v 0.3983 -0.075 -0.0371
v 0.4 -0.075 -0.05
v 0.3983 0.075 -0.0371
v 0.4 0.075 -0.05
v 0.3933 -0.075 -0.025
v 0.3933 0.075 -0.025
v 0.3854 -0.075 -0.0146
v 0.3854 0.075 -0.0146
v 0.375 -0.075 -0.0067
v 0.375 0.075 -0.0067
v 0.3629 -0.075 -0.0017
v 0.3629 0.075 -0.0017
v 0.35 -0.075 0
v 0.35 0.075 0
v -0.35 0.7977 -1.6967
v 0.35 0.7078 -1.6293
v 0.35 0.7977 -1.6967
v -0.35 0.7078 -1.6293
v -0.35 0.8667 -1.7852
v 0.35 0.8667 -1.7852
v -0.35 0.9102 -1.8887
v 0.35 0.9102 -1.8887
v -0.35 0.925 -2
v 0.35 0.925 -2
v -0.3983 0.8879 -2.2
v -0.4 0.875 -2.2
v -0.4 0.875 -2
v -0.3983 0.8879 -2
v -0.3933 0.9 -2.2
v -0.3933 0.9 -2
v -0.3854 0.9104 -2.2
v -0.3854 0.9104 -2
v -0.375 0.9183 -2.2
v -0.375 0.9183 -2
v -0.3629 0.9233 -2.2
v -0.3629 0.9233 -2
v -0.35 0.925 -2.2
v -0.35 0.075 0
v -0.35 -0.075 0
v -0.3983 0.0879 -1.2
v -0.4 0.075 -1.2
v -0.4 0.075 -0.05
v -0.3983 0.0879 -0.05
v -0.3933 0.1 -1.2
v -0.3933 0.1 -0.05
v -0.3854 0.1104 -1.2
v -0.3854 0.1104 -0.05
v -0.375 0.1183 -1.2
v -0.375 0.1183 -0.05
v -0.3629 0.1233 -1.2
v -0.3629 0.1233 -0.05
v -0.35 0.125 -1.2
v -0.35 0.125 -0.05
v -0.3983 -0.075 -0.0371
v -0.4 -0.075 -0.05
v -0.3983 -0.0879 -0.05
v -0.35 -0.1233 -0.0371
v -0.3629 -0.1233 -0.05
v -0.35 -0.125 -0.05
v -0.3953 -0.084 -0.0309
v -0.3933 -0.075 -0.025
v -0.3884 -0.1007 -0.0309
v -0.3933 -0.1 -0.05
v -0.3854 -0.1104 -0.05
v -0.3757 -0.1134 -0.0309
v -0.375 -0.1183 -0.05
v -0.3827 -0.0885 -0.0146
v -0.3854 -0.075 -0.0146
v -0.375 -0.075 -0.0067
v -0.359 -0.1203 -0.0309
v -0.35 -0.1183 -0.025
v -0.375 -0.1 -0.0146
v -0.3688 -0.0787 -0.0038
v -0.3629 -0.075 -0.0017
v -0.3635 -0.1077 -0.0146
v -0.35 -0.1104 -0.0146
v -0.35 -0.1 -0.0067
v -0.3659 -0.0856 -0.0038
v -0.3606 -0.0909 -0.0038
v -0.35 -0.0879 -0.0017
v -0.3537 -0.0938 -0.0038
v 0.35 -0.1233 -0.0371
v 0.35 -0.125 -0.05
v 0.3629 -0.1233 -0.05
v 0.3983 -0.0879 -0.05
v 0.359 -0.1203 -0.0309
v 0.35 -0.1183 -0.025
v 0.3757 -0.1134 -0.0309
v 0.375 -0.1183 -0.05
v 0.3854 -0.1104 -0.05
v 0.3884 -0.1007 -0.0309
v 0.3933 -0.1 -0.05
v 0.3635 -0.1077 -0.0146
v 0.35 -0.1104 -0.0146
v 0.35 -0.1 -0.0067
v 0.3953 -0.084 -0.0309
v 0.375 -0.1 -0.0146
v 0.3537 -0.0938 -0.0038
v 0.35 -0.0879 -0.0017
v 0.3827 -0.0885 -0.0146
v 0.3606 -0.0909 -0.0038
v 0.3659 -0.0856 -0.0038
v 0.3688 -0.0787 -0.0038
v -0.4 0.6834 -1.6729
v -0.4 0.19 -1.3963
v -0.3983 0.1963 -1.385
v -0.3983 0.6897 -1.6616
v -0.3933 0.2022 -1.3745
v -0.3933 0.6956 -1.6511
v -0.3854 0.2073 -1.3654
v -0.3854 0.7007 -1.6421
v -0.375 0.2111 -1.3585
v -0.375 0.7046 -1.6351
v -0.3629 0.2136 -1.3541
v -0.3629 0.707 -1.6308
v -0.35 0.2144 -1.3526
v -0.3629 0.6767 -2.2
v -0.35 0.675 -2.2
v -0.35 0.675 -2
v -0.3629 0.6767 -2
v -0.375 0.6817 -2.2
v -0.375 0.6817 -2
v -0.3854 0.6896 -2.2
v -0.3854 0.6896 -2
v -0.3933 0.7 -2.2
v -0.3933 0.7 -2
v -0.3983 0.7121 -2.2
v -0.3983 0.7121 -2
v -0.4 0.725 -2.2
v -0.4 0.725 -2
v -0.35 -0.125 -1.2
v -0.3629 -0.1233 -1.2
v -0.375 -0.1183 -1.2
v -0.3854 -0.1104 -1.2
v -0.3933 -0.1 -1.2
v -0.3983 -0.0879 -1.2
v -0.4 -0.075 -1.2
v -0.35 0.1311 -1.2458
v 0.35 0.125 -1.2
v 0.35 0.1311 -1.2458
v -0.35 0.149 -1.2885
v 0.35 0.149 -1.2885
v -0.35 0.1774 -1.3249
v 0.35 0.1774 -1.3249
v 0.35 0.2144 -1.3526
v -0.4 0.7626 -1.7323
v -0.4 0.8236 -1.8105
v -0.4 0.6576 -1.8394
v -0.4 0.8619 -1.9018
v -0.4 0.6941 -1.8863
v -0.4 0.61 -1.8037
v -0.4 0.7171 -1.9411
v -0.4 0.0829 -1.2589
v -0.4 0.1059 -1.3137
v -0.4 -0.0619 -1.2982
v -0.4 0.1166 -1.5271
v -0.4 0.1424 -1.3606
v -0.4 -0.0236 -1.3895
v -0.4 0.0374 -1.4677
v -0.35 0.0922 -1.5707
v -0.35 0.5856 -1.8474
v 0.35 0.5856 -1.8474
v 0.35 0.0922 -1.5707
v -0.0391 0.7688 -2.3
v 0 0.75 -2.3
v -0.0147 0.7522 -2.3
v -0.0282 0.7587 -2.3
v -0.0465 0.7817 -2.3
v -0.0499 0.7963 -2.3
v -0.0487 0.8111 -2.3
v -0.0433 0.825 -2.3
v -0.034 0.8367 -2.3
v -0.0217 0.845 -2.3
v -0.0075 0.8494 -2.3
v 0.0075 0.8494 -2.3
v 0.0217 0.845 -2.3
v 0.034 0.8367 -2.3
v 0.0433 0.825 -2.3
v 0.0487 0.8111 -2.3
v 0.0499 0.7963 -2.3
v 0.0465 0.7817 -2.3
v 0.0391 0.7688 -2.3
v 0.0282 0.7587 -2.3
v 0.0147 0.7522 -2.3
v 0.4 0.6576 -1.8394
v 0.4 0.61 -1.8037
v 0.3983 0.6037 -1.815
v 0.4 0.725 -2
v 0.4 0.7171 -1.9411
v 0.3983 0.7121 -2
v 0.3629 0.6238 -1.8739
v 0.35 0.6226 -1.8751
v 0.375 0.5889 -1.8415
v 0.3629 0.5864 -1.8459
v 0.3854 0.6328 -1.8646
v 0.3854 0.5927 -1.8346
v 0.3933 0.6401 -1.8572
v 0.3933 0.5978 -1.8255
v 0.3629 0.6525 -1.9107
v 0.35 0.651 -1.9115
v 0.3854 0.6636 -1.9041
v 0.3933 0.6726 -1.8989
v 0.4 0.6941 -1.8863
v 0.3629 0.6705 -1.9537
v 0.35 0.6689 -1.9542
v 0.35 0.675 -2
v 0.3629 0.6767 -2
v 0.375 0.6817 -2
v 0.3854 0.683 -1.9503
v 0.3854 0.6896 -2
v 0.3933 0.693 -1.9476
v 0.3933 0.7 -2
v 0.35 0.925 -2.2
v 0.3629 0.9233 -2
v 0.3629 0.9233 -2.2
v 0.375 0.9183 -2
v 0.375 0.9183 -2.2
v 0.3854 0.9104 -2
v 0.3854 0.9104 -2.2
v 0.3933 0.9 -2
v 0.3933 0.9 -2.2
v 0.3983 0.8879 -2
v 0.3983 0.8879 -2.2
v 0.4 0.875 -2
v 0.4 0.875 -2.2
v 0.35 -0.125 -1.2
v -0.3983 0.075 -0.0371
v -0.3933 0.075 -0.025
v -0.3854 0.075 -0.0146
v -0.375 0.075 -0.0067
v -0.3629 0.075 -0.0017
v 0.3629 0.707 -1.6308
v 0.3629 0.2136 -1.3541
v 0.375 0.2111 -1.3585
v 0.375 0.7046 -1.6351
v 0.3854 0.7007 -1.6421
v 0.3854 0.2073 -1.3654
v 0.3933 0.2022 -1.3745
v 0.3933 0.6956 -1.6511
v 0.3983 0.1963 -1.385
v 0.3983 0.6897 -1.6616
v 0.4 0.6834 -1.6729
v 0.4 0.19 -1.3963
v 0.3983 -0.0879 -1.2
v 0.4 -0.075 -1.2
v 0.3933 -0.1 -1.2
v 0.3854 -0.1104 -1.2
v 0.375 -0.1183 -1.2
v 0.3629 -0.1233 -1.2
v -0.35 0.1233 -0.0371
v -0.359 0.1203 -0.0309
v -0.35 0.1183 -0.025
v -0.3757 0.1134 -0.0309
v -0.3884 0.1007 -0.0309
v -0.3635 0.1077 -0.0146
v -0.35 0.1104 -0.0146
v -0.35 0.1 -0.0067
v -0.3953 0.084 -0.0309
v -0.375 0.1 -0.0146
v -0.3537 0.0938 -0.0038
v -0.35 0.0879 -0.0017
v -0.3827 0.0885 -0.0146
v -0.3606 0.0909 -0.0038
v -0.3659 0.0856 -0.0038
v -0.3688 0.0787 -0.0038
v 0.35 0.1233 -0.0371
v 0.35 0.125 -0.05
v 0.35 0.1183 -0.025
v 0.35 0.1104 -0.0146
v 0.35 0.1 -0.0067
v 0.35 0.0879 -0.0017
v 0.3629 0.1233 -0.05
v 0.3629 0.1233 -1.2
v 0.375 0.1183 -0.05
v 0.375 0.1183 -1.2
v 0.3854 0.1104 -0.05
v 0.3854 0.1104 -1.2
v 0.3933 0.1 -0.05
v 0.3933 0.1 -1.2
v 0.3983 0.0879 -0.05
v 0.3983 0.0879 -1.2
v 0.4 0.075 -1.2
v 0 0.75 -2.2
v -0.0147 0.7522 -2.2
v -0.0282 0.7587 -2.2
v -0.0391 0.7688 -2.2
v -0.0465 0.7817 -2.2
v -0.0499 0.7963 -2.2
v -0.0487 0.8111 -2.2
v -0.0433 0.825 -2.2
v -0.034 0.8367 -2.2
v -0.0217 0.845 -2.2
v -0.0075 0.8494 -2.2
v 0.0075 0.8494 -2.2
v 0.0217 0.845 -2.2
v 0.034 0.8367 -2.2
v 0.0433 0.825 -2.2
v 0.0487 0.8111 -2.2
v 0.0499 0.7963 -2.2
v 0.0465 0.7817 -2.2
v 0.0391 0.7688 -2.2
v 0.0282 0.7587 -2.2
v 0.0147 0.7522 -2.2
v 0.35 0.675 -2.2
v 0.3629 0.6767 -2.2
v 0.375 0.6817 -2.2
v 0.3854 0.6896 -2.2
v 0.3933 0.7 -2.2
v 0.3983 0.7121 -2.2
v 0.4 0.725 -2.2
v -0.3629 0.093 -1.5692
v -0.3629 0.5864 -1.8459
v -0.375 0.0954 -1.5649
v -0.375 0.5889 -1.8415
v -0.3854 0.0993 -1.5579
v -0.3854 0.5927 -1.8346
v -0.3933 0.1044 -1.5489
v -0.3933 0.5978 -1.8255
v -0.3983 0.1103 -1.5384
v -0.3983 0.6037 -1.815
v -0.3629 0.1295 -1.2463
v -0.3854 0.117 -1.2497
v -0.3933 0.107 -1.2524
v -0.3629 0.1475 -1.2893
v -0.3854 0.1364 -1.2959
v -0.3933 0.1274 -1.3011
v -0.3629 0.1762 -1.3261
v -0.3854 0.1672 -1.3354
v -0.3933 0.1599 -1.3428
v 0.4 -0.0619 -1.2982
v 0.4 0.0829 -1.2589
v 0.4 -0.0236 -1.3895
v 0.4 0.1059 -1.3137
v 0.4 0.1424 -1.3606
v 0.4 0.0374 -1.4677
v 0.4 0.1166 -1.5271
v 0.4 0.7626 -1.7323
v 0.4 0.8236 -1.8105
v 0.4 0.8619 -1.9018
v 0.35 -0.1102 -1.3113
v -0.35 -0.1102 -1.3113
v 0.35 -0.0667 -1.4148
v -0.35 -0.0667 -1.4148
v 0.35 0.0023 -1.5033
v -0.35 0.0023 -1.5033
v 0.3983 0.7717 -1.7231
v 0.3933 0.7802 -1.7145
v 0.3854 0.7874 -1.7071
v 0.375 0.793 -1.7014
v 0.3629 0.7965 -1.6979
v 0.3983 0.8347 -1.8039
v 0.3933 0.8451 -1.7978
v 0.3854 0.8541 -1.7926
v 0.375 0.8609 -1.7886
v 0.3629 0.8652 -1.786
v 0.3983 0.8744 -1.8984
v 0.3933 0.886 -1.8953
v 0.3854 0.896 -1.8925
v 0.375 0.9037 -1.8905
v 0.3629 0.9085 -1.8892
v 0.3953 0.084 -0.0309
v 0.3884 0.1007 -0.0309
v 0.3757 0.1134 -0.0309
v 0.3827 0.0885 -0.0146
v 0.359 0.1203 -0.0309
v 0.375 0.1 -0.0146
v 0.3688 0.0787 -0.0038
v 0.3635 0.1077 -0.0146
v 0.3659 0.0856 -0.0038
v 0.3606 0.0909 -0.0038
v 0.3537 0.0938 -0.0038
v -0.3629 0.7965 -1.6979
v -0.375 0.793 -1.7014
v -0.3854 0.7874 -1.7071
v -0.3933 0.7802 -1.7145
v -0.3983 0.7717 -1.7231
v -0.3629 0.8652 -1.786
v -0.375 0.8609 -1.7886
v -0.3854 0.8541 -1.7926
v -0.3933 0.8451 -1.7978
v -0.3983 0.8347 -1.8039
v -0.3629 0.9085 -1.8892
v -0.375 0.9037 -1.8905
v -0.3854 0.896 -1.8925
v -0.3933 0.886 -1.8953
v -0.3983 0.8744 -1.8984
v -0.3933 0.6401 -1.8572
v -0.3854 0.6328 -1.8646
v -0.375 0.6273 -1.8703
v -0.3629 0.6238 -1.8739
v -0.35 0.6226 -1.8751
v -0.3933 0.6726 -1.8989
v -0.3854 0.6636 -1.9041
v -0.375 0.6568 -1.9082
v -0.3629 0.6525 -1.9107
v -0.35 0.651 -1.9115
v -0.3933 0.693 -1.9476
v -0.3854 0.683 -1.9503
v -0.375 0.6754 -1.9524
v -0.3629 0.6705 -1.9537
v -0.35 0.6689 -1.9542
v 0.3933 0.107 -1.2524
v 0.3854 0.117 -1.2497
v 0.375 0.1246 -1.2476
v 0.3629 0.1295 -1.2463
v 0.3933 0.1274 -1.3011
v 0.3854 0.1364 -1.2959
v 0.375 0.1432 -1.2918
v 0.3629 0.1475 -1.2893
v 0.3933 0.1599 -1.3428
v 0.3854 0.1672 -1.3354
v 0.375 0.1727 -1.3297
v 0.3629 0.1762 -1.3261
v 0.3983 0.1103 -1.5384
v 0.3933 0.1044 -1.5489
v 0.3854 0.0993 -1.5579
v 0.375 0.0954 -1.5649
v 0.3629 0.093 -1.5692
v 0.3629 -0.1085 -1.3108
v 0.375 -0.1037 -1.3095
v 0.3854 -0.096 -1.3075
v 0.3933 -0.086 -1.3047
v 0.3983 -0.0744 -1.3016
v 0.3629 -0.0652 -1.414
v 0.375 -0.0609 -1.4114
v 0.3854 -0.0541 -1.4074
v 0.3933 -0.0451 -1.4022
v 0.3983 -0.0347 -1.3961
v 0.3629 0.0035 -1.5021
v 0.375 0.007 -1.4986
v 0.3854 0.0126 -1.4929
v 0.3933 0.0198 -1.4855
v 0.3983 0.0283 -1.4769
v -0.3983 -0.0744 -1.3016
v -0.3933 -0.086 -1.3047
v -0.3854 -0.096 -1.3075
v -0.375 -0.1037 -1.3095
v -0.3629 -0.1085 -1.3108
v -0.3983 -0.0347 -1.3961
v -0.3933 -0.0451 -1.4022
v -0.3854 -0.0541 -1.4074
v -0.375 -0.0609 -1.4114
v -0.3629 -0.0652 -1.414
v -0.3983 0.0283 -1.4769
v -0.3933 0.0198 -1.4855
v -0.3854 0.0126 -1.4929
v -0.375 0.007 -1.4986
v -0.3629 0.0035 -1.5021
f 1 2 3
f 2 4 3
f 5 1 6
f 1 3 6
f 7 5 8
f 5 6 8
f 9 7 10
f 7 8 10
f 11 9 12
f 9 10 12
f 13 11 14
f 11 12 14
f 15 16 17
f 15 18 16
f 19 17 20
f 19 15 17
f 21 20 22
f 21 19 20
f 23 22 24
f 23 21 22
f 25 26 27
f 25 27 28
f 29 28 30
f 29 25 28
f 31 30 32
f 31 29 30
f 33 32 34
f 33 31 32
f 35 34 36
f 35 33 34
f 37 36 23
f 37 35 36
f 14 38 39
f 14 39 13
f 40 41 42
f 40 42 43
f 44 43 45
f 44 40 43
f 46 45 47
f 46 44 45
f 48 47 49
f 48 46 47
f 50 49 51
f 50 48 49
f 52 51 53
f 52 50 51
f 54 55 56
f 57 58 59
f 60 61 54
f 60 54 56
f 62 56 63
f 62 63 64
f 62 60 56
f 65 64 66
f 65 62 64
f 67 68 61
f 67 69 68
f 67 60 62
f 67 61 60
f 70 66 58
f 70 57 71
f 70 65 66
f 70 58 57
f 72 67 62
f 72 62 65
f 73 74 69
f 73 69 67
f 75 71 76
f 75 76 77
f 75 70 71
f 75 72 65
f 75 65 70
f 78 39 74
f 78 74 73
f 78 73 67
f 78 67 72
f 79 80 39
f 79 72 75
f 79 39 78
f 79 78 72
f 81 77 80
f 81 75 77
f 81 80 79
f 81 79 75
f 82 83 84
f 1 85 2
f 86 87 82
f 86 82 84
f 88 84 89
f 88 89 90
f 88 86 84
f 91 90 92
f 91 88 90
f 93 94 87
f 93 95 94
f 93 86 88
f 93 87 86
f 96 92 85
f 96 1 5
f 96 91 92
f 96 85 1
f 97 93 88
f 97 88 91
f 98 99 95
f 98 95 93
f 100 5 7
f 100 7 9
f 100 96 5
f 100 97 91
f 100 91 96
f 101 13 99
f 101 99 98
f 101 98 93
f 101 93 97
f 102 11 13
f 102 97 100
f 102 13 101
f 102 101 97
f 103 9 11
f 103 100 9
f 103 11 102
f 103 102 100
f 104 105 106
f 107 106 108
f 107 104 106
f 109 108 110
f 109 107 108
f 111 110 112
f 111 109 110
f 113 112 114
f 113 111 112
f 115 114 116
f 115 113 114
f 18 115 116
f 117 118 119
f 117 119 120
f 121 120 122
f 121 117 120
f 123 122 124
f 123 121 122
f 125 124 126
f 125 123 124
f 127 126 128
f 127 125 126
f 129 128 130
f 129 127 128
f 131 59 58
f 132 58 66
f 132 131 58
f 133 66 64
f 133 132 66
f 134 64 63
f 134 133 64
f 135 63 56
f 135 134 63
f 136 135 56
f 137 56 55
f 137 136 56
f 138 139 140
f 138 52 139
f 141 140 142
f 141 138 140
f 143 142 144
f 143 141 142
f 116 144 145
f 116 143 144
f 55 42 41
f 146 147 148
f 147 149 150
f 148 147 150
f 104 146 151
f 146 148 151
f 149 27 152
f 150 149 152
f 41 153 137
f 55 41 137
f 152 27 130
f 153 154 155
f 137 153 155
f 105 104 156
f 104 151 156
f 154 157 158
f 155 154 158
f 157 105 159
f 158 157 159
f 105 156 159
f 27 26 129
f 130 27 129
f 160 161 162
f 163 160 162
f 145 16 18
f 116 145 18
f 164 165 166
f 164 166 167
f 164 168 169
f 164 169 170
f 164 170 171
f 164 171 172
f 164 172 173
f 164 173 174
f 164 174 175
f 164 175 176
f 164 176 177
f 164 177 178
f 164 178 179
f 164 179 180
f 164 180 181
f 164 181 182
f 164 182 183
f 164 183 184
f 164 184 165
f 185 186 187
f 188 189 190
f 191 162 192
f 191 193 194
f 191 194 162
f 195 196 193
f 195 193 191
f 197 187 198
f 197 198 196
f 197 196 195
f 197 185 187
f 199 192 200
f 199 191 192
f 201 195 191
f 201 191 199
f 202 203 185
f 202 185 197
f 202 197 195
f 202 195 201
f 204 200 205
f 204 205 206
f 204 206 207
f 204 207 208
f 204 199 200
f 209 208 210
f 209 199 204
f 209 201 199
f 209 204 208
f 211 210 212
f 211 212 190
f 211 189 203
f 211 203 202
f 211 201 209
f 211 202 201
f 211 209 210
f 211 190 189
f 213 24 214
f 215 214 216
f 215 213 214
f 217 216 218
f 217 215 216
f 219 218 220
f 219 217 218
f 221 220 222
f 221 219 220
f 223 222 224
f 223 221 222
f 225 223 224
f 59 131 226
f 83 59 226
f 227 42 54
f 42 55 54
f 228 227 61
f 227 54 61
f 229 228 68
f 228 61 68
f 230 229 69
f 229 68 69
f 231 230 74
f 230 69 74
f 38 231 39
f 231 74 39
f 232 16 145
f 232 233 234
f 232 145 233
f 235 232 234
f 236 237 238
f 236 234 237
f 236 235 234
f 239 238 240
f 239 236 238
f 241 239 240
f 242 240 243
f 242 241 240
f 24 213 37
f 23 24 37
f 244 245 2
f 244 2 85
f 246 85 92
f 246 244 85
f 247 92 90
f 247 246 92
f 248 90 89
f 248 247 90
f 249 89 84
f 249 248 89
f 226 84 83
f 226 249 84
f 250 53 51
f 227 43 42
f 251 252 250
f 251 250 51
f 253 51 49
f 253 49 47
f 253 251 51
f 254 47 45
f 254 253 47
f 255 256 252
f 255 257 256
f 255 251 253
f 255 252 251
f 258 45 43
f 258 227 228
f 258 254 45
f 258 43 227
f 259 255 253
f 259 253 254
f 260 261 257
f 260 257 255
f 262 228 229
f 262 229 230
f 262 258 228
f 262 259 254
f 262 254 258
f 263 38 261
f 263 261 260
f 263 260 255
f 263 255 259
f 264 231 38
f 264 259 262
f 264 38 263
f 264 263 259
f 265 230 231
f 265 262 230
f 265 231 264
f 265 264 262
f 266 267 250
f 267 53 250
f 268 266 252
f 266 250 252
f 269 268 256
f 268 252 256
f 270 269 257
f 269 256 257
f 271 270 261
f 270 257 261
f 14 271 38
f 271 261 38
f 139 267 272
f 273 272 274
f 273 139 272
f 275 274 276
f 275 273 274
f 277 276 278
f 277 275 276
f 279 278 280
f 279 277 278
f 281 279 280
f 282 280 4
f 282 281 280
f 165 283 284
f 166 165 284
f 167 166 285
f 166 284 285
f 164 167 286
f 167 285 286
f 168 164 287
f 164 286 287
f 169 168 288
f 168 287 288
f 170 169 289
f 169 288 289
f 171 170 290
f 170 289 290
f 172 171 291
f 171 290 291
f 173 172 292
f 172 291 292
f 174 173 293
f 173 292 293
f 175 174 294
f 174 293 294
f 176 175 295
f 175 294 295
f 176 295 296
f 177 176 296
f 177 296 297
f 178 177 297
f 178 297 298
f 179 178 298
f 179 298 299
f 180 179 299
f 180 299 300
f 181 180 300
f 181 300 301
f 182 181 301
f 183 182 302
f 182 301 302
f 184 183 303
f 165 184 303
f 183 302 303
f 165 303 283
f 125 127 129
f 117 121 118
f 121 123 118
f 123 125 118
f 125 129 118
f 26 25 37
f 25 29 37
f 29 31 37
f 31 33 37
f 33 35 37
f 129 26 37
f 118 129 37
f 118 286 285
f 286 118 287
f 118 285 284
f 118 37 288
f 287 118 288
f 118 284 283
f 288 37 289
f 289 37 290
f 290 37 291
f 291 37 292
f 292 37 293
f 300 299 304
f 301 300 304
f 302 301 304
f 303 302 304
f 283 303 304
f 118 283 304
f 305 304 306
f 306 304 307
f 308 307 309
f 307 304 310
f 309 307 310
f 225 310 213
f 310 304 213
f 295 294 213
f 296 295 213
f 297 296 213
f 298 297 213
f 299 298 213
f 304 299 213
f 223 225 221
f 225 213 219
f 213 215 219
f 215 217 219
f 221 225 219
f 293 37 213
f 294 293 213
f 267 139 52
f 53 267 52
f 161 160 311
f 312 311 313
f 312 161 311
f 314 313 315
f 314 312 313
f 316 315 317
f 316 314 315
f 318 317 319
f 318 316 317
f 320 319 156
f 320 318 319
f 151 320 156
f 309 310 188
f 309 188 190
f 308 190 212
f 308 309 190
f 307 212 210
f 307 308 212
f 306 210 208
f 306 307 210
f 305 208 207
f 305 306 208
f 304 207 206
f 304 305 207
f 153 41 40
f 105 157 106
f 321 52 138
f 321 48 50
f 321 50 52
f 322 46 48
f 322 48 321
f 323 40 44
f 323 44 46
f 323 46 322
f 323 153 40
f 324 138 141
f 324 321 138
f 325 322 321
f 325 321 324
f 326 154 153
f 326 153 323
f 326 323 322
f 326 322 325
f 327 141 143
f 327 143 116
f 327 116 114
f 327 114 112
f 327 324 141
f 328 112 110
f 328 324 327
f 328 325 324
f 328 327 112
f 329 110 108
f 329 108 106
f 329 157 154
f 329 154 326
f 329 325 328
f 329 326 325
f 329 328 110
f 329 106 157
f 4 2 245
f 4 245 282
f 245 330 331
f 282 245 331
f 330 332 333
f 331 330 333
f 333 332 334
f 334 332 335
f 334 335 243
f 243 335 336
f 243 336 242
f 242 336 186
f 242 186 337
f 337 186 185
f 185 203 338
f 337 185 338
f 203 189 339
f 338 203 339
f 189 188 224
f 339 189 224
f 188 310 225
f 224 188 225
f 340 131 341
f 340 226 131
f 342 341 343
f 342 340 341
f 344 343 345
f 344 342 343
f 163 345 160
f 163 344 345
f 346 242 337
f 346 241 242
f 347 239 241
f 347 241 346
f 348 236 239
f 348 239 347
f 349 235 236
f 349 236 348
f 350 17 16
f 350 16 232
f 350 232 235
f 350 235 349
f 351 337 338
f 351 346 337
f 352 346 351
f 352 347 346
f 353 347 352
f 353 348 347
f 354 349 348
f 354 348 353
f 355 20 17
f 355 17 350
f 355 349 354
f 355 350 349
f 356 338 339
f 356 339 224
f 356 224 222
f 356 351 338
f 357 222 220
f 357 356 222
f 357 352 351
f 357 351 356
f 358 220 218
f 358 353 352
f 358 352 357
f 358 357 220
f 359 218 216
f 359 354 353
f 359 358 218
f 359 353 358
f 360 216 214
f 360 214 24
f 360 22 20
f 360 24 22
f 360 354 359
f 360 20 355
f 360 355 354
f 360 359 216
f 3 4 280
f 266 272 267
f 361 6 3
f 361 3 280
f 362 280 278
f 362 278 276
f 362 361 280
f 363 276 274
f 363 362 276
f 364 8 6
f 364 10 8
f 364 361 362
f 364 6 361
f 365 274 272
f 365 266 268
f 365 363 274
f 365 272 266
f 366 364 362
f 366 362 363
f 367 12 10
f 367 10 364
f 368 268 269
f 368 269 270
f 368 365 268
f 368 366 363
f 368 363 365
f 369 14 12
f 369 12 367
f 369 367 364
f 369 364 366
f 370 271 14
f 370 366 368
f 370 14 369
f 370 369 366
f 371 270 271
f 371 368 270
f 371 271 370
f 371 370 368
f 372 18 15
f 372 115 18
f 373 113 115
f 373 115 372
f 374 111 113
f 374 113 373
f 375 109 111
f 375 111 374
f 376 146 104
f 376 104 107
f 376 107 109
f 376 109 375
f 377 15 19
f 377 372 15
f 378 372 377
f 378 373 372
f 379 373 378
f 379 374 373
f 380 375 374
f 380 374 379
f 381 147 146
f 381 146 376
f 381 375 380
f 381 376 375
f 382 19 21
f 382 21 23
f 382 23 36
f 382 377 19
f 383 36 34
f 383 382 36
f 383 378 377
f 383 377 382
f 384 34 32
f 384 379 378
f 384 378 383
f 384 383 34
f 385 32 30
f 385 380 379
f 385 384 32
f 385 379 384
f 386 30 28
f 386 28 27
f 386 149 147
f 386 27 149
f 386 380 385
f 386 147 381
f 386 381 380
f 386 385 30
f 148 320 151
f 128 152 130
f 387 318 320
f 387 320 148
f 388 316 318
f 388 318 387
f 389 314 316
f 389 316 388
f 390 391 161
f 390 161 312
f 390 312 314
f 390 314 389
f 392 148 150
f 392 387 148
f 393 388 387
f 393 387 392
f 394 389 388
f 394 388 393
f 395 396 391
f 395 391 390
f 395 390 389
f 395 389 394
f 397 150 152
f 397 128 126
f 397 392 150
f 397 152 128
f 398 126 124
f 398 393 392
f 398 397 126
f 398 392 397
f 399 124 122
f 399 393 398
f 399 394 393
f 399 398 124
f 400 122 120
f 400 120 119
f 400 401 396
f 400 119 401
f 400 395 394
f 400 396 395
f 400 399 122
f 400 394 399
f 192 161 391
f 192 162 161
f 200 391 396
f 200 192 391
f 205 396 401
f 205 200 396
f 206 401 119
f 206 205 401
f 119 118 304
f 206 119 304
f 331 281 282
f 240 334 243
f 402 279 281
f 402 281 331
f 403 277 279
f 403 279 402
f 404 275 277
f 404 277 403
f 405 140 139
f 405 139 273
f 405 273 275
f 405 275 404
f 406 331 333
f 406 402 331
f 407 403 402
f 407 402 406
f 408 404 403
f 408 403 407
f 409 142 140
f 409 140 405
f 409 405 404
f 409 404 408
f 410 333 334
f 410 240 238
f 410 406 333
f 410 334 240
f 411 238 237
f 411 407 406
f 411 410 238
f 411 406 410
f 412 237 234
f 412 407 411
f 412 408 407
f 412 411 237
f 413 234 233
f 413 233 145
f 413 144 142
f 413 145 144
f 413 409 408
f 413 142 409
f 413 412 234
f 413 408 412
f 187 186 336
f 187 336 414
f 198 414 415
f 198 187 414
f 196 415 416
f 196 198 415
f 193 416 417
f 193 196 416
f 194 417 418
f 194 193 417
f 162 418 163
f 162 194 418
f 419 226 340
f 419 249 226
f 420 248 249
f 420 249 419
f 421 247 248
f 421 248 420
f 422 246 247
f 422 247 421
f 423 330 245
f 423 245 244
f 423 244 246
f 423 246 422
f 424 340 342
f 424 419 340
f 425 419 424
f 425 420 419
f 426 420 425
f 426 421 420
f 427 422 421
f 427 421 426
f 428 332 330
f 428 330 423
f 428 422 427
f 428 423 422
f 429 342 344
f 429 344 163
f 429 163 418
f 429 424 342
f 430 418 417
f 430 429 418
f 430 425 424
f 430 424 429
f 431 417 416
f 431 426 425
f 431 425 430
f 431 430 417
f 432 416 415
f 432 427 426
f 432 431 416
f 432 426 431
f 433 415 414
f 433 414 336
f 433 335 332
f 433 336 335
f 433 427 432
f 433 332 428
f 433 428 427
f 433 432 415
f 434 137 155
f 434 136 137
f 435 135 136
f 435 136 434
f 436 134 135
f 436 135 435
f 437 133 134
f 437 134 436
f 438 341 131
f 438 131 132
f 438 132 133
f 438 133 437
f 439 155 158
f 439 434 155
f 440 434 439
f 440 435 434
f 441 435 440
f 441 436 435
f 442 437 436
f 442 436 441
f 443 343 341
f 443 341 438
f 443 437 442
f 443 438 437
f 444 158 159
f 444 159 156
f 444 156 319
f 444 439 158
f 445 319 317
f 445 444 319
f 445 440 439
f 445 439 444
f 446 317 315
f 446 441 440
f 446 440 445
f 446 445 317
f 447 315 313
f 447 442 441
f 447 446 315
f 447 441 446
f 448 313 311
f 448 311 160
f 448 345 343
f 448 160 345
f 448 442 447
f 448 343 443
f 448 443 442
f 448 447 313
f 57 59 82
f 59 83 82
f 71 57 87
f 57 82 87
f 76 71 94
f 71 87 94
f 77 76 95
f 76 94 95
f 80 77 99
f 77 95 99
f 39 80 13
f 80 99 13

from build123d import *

# Parameters (mm, degrees)
FILETE2_R                = 0.05
ESBO_O3_R                = 0.05
RESSALTO_EXTRUS_O1_DEPTH = 0.1


with BuildPart() as part:
    # Varredura1: sweep along a path in Esboço2
    with BuildLine(Plane(origin=(0, 0, 0), x_dir=(0, 0, -1), z_dir=(1, 0, 0))) as varredura1_path:
        Line((0, 0), (1.2, 0))
        ThreePointArc((1.2, 0), (1.35163484, 0.041143137), (1.461678126, 0.153287497))
        Line((1.461678126, 0.153287497), (1.738321874, 0.646712503))
        ThreePointArc((1.738321874, 0.646712503), (1.84836516, 0.758856863), (2, 0.8))
        Line((2, 0.8), (2.2, 0.8))
    # Esboço1 → Varredura1 (sweep)
    with BuildSketch(Plane.XY):
        with BuildLine():
            Line((-0.35, -0.125), (0.35, -0.125))
            ThreePointArc((0.35, -0.125), (0.385355339, -0.110355339), (0.4, -0.075))
            Line((0.4, -0.075), (0.4, 0.075))
            ThreePointArc((0.4, 0.075), (0.385355339, 0.110355339), (0.35, 0.125))
            Line((0.35, 0.125), (-0.35, 0.125))
            ThreePointArc((-0.35, 0.125), (-0.385355339, 0.110355339), (-0.4, 0.075))
            Line((-0.4, 0.075), (-0.4, -0.075))
            ThreePointArc((-0.4, -0.075), (-0.385355339, -0.110355339), (-0.35, -0.125))
        make_face()
    sweep(path=varredura1_path.line)

    # Filete2
    filete2_edges = [part.edges().sort_by_distance(p)[0] for p in [
        (-0.4, 0, 0),
        (-0.385355339, 0.110355339, 0),
        (0, 0.125, 0),
        (0.385355339, 0.110355339, 0),
        (0.4, 0, 0),
        (0.385355339, -0.110355339, 0),
        (0, -0.125, 0),
        (-0.385355339, -0.110355339, 0),
    ]]
    fillet(filete2_edges, radius=FILETE2_R)

    # Esboço3 → Ressalto-extrusão1 (add)
    with BuildSketch(Plane(origin=(0, 0, -2.2), x_dir=(-1, 0, 0), z_dir=(0, 0, -1))):
        with Locations(Location((0, 0.8, 0), (0, 0, 270))):
            Circle(ESBO_O3_R)
    extrude(amount=RESSALTO_EXTRUS_O1_DEPTH)


solid = part.part
